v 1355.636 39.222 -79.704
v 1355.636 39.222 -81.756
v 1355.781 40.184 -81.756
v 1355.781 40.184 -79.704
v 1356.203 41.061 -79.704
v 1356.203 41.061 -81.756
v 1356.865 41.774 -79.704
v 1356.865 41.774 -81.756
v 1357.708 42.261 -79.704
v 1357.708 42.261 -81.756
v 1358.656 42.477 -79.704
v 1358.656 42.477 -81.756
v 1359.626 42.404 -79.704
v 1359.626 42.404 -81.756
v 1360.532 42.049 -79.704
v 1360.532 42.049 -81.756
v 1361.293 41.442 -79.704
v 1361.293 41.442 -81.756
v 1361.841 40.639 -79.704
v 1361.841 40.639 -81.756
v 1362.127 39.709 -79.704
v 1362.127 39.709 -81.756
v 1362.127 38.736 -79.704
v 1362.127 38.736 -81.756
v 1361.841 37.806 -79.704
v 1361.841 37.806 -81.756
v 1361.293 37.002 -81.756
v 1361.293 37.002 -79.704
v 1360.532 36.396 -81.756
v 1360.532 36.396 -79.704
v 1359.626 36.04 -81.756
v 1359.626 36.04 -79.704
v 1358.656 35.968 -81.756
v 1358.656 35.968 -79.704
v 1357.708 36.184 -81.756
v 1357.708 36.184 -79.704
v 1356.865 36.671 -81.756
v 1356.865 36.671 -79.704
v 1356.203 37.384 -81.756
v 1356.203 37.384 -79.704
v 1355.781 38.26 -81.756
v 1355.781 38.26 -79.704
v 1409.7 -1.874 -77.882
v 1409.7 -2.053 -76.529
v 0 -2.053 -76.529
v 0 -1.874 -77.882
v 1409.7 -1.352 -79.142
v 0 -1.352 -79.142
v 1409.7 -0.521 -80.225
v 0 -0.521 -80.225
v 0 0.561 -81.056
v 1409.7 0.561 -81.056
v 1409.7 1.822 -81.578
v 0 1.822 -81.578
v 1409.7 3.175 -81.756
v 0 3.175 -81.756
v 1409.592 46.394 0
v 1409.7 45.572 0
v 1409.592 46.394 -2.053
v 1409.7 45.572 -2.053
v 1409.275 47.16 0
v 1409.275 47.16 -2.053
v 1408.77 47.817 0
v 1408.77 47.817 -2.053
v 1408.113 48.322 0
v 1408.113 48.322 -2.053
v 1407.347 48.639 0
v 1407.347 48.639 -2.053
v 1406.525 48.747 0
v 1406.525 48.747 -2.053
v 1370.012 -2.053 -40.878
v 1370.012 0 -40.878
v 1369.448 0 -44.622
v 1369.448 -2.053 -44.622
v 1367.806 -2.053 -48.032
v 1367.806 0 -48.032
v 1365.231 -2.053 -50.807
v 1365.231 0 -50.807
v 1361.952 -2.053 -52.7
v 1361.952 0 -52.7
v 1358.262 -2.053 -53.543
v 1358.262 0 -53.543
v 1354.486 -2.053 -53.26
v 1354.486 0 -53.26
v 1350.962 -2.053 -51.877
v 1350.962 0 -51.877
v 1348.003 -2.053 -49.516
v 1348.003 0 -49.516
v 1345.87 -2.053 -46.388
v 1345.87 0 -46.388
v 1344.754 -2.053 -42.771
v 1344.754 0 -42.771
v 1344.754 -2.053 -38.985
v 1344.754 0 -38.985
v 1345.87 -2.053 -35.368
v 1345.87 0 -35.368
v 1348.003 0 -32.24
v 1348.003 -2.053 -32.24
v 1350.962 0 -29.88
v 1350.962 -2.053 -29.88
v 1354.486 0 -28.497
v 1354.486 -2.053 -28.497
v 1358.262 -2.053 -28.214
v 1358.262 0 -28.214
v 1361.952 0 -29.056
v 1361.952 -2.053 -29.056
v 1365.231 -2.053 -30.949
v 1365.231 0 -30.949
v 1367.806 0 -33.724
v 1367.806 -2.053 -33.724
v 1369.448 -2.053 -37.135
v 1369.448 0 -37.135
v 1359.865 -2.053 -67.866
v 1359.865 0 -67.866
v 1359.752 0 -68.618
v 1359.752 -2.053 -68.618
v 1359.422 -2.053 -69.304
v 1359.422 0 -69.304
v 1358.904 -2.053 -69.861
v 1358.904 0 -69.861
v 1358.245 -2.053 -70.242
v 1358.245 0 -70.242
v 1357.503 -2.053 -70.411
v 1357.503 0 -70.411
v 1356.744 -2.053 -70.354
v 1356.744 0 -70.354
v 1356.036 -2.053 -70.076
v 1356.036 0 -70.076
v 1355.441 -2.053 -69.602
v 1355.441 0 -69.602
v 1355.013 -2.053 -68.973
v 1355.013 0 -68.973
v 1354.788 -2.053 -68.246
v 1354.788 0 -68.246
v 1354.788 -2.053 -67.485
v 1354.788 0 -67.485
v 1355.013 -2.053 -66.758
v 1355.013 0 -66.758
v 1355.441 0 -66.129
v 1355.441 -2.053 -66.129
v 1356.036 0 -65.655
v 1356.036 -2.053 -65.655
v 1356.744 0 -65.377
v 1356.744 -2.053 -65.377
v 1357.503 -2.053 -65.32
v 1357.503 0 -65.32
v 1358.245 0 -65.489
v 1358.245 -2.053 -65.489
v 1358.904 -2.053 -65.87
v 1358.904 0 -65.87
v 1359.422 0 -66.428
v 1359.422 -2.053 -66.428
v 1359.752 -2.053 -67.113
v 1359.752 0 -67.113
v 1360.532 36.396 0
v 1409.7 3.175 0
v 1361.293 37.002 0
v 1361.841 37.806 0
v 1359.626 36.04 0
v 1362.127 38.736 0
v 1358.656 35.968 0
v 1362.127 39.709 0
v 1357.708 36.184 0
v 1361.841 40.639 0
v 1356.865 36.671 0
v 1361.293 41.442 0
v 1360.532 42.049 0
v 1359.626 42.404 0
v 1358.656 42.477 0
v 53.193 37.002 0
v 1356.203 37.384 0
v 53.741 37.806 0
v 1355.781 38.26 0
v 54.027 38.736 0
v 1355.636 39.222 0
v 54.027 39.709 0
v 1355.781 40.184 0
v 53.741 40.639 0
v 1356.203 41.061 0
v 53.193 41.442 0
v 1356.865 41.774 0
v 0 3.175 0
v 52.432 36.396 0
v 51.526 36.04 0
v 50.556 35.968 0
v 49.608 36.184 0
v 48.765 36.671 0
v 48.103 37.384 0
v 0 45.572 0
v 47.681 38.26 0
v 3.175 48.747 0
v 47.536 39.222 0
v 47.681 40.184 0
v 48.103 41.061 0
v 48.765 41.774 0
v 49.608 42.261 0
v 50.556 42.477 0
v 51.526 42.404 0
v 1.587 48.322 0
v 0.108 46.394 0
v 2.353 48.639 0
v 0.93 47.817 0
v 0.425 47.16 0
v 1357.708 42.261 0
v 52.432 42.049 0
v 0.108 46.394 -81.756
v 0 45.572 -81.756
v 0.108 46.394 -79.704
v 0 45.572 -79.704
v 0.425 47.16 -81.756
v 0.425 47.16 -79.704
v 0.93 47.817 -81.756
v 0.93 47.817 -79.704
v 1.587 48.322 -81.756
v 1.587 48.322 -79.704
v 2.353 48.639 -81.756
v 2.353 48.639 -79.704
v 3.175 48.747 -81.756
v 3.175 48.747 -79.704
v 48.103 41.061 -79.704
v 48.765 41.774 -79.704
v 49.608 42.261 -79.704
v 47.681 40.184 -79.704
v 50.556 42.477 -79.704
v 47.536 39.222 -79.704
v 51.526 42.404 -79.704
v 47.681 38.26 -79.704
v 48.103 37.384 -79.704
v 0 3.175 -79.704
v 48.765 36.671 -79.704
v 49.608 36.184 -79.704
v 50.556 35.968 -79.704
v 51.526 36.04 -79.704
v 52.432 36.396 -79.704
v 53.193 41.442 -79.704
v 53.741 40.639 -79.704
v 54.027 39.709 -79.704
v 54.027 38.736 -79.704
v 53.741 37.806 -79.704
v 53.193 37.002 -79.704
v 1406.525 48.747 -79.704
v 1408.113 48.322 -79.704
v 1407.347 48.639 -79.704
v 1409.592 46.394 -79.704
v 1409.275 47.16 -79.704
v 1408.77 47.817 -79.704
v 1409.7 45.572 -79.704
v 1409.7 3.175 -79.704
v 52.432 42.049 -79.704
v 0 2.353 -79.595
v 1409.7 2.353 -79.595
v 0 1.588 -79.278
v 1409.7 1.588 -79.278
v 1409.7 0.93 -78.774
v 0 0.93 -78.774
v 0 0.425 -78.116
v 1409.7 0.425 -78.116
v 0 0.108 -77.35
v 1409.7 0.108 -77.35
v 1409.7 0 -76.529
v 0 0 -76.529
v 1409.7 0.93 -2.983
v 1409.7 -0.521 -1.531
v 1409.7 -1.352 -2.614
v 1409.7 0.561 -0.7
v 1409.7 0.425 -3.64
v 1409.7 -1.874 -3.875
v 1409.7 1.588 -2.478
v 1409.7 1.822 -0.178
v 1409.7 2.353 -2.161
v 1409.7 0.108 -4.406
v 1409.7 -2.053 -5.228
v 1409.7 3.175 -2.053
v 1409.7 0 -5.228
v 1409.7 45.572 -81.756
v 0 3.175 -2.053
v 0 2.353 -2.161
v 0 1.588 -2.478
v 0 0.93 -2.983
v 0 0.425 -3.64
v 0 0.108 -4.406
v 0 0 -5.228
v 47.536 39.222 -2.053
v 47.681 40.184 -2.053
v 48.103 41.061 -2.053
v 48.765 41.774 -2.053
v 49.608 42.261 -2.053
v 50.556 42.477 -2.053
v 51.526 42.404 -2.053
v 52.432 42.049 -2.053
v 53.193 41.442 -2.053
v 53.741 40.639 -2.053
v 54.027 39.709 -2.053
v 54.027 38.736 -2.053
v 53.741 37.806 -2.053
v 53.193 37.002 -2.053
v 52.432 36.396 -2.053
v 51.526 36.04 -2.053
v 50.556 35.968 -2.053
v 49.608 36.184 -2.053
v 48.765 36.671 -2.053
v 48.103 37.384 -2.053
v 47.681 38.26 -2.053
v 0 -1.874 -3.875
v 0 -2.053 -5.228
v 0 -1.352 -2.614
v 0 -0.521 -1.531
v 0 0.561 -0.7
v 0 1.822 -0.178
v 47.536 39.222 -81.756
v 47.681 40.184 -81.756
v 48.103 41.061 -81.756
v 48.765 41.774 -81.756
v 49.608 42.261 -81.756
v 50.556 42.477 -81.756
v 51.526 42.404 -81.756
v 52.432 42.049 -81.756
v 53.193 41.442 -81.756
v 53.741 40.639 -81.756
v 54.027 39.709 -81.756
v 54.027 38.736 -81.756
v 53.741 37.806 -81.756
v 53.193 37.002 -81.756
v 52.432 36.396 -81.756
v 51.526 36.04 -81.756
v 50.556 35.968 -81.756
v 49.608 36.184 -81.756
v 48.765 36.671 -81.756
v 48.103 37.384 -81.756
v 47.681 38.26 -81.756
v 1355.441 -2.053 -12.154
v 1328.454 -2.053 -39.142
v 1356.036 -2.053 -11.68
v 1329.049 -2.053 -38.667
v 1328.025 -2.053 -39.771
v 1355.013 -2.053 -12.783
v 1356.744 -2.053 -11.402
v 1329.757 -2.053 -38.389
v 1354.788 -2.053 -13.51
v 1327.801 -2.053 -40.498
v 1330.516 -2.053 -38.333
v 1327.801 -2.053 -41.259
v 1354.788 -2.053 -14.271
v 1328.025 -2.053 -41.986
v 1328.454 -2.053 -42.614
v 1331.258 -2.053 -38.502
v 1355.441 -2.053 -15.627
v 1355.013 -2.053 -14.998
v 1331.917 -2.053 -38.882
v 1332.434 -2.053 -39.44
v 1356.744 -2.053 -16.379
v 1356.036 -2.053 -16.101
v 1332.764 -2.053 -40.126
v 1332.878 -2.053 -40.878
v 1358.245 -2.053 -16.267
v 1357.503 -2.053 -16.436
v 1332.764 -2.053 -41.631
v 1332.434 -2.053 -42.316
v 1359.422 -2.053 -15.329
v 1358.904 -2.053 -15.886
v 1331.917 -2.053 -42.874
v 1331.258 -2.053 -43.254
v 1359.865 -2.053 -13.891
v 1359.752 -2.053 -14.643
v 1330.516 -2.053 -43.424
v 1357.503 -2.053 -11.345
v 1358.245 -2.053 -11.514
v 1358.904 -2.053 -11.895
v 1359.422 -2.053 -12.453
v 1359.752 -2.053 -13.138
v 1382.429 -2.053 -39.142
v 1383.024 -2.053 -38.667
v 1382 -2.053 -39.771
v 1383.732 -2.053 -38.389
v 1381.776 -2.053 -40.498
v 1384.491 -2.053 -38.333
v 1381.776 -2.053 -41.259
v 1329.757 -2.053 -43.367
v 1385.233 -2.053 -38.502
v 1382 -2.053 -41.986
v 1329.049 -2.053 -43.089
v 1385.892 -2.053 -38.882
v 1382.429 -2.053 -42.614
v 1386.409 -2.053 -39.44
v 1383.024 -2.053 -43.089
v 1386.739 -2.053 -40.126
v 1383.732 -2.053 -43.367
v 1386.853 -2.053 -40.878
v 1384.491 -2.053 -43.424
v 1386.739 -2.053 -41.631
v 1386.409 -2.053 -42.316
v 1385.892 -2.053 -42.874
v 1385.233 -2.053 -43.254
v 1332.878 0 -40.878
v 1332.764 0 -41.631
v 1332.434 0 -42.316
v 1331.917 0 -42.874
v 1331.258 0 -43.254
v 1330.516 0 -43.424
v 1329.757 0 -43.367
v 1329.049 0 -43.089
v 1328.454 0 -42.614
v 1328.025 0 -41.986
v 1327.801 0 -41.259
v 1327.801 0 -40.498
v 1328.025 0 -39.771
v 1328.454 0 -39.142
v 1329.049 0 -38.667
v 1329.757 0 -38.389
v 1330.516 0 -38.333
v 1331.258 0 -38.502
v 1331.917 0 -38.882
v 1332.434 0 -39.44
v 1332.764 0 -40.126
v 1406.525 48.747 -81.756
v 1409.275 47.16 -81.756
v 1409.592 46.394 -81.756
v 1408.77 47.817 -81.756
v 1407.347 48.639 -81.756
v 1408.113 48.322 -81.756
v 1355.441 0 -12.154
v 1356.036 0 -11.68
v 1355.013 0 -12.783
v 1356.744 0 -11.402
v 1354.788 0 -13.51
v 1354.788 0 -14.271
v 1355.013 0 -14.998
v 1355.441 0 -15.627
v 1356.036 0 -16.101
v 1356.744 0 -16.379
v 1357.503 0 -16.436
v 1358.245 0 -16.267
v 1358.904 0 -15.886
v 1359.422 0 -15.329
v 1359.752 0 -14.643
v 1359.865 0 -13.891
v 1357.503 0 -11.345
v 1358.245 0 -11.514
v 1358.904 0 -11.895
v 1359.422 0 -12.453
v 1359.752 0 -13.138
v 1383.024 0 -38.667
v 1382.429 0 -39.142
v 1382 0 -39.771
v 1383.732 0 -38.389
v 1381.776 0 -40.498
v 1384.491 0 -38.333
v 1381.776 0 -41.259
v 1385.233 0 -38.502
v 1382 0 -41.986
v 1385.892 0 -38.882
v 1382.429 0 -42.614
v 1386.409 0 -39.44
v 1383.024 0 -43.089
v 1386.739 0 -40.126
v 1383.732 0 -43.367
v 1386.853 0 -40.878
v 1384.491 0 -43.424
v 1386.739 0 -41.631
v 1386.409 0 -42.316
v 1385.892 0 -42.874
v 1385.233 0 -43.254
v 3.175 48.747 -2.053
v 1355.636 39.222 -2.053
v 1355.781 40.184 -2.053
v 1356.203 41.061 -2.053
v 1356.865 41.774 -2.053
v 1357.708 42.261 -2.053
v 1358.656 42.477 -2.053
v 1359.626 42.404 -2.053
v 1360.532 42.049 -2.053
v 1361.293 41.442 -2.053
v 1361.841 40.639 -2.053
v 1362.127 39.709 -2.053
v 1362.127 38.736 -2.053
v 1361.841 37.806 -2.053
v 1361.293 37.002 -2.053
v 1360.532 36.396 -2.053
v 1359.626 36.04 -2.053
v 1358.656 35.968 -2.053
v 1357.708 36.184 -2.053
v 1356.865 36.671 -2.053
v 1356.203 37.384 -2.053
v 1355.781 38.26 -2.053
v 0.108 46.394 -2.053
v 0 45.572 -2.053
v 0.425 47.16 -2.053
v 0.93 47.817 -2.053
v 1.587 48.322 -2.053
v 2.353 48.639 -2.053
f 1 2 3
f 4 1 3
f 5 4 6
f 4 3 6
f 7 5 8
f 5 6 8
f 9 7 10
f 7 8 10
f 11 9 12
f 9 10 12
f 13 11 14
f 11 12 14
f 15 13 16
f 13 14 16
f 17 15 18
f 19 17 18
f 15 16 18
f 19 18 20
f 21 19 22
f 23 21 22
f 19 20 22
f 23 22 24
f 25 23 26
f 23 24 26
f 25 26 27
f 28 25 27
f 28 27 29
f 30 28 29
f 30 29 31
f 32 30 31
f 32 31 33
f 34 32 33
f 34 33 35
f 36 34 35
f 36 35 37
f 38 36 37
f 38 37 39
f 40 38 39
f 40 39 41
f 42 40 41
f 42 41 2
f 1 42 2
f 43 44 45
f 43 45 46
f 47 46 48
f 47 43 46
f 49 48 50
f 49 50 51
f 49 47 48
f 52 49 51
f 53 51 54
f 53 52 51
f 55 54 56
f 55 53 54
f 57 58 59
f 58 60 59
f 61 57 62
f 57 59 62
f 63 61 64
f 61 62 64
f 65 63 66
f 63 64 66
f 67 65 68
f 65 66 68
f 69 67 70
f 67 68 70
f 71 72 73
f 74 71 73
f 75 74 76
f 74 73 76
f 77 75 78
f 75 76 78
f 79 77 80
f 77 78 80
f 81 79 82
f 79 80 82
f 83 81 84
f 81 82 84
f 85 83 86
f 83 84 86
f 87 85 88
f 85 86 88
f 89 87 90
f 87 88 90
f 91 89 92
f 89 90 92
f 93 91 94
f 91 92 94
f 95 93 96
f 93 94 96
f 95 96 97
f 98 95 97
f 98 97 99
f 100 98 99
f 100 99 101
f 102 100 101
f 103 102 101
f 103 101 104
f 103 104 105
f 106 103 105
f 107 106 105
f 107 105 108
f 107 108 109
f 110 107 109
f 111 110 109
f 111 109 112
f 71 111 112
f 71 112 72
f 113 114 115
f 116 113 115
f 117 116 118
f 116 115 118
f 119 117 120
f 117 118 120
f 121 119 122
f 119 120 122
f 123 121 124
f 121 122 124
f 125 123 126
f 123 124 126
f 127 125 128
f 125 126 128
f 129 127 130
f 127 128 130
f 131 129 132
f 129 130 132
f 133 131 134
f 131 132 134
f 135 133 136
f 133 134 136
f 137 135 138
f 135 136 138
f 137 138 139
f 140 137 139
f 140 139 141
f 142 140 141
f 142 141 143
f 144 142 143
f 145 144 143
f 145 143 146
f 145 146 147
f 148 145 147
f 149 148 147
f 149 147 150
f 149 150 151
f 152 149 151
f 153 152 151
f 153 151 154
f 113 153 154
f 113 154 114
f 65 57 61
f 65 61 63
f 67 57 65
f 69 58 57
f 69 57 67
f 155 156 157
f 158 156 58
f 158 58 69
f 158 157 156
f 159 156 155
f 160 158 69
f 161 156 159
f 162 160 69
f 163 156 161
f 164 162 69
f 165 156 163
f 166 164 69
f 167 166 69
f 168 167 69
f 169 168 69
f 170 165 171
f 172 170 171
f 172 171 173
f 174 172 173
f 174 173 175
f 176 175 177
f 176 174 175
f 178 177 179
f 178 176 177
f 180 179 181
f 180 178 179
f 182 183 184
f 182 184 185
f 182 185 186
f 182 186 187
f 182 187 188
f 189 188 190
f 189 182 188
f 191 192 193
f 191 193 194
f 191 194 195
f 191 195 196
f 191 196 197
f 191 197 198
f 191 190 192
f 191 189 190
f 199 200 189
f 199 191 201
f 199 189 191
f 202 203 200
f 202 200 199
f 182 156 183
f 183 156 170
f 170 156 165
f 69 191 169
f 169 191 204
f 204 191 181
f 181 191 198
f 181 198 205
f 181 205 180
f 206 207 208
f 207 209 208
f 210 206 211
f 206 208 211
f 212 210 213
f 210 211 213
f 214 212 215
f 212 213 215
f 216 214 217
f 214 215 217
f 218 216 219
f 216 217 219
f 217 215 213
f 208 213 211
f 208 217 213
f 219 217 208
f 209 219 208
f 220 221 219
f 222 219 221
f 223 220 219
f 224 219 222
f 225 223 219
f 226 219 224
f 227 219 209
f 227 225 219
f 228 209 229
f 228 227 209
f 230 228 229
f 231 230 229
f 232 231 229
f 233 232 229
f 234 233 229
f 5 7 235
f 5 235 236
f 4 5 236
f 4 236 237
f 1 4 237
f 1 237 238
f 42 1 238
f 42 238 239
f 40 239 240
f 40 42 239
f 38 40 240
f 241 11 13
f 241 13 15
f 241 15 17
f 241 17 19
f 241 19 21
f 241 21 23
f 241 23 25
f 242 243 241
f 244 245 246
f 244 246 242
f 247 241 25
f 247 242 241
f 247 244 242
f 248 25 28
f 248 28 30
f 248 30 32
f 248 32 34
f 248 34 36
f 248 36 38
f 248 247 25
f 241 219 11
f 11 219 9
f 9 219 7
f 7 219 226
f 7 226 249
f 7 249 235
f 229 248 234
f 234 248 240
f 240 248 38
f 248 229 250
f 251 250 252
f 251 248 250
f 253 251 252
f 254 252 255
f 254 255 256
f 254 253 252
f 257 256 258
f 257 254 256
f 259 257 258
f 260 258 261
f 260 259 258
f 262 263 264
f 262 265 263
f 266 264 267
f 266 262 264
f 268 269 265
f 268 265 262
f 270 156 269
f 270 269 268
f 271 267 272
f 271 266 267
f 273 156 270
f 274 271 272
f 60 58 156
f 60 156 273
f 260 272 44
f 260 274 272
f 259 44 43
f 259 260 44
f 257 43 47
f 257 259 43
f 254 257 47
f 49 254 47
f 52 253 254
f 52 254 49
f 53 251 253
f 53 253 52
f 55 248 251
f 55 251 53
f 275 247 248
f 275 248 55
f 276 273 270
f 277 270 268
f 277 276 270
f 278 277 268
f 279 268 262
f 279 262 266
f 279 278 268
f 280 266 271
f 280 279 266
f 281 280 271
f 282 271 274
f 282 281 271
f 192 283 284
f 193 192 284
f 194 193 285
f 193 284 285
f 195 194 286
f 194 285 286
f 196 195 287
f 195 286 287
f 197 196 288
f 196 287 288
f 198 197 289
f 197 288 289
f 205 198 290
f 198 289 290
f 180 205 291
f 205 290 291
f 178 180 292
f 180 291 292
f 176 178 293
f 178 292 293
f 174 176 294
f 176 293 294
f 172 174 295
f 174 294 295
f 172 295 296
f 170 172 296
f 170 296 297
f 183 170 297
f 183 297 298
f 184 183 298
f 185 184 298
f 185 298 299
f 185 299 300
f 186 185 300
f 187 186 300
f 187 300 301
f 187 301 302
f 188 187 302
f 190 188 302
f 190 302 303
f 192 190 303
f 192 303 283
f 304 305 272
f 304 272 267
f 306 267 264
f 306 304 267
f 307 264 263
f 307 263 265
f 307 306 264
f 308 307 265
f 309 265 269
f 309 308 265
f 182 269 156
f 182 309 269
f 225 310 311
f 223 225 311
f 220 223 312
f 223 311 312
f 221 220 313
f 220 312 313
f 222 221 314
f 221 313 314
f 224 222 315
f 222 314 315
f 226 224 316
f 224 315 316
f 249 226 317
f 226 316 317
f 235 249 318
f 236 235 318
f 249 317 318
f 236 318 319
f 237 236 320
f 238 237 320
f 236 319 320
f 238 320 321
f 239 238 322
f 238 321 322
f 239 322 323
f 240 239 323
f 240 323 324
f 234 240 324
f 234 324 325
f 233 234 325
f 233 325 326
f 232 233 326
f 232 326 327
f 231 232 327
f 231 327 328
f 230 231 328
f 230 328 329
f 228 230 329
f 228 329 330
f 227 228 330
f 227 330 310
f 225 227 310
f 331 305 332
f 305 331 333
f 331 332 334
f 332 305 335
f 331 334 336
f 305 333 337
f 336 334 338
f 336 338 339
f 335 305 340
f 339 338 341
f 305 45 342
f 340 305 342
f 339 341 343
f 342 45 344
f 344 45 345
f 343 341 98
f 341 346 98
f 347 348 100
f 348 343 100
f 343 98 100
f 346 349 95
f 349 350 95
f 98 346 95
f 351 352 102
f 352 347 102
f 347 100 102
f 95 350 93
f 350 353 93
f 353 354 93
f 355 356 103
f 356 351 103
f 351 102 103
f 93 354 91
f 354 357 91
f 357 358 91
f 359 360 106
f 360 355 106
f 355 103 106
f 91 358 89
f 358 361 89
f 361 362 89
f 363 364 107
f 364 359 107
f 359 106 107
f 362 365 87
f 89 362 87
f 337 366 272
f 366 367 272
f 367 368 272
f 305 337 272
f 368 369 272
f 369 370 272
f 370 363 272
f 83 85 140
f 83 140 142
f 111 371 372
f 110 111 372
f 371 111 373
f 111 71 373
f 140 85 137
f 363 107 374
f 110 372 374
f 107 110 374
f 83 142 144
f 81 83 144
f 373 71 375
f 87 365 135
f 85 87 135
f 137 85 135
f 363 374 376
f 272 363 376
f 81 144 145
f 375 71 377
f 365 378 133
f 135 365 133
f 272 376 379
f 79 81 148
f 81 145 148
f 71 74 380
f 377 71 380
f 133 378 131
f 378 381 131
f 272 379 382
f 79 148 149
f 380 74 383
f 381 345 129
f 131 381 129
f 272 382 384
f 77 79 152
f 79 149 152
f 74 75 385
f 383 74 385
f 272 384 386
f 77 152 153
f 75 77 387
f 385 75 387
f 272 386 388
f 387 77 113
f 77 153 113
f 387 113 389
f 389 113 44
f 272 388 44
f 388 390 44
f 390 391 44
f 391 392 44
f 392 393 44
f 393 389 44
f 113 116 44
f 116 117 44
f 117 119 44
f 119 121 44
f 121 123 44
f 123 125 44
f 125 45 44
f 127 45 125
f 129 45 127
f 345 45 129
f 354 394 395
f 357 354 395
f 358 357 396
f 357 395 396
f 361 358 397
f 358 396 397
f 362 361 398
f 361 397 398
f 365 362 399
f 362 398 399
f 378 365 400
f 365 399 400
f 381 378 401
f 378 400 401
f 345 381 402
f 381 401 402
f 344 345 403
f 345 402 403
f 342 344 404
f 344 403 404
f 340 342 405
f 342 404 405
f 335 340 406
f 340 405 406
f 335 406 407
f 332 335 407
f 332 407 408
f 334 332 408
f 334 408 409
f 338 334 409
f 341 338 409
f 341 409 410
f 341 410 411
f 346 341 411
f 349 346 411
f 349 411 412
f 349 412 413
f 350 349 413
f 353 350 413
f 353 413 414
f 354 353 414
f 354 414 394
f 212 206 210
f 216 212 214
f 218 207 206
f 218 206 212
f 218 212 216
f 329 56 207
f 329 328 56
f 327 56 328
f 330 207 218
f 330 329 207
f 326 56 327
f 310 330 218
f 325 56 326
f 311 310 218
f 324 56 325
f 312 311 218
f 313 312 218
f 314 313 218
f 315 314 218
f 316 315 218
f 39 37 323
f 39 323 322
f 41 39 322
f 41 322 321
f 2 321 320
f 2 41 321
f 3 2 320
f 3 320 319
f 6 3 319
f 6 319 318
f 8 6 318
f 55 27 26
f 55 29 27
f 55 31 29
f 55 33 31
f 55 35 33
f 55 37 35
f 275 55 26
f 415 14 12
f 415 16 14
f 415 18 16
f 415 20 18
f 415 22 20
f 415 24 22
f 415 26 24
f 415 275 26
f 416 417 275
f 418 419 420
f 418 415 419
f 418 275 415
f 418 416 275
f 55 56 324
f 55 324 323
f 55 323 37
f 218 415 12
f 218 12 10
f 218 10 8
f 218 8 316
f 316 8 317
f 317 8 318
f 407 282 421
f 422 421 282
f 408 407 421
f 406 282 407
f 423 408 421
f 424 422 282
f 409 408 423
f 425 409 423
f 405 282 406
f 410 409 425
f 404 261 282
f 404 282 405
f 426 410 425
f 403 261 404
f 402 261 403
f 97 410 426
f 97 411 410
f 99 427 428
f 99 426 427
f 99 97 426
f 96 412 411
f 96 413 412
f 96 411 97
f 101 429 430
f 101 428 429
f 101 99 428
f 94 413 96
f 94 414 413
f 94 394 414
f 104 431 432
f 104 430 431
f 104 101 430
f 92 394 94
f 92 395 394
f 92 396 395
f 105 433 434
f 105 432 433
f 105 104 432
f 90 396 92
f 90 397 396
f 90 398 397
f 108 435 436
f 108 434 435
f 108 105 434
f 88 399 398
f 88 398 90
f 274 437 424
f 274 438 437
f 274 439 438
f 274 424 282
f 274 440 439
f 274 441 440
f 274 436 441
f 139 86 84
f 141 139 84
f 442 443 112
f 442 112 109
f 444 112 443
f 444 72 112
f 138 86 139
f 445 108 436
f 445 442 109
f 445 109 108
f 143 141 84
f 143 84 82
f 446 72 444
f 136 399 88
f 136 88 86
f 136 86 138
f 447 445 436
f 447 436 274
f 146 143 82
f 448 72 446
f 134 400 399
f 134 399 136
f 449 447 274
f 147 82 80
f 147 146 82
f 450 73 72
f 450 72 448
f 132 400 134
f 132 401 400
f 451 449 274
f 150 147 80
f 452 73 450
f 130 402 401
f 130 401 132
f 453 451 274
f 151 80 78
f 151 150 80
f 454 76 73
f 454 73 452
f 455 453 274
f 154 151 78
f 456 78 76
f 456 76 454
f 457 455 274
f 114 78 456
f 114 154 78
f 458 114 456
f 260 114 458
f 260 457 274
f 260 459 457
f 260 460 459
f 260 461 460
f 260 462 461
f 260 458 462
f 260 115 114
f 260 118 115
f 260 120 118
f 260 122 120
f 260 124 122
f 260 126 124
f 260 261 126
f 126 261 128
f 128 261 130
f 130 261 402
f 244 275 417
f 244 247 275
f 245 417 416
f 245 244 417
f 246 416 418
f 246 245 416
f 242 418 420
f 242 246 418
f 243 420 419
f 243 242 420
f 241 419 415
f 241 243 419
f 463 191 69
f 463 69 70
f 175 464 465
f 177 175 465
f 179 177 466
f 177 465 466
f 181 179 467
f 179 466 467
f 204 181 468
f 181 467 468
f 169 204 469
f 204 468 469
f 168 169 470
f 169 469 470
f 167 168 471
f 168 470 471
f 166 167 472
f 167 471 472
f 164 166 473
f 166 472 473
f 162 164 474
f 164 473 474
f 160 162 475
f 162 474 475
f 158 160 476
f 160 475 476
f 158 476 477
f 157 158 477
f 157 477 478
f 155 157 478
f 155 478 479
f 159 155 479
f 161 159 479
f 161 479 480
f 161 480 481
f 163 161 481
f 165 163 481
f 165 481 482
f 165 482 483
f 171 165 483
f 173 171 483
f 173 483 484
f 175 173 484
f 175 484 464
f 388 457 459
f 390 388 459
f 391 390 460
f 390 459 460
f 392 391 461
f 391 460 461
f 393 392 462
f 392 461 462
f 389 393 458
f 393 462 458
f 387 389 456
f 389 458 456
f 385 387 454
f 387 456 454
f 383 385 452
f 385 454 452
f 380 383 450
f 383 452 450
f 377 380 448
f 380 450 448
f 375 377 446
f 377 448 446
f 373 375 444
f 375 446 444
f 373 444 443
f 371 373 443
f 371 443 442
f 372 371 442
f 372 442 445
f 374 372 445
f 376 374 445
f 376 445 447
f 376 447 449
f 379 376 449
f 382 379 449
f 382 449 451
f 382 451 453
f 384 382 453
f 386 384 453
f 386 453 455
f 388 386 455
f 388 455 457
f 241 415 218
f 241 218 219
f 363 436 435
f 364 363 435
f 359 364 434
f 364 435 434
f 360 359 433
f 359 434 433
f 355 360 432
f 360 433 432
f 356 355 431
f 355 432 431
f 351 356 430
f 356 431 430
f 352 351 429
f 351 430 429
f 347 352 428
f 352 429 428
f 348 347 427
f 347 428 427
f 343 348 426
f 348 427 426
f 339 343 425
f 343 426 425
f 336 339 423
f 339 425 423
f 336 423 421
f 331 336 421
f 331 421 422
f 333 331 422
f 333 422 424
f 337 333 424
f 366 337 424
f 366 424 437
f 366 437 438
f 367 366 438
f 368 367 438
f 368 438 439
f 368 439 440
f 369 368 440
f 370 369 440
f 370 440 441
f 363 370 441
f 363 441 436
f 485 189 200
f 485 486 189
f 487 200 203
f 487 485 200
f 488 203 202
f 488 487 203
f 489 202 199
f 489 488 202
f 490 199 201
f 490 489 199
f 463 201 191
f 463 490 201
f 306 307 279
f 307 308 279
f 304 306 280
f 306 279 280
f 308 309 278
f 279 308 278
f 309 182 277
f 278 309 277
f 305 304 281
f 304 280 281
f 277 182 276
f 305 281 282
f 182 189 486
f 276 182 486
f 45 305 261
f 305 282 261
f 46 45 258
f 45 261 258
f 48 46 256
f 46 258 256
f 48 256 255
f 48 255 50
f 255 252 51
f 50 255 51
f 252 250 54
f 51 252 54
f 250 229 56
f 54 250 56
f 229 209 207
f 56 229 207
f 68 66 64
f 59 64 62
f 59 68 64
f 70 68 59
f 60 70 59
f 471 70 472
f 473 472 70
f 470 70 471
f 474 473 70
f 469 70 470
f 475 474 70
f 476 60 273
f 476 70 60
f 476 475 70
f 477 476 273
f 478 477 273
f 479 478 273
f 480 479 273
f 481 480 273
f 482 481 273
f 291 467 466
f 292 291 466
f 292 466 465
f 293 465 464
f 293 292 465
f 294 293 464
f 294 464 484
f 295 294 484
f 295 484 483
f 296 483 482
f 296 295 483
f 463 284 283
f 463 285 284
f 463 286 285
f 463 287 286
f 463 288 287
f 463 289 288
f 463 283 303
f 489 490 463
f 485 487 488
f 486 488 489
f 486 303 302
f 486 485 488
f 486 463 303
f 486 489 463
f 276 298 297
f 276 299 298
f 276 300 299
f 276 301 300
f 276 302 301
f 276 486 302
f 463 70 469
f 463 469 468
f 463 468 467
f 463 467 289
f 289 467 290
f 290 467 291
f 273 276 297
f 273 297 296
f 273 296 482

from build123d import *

# Parameters (mm, degrees)
SKETCH1_W                      = 1409.7
SKETCH1_H                      = 81.75625
BASE_FLANGE1_DEPTH             = 2.052574
EDGE_FLANGE1_STRIP_W           = 14.560296
EDGE_FLANGE1_STRIP_H           = 2.052574
EDGE_FLANGE1_STRIP_CUT_DEPTH   = 1409.7
EDGE_FLANGE1_STRIP_2_W         = 14.560296
EDGE_FLANGE1_STRIP_2_H         = 2.052574
EDGE_FLANGE1_STRIP_CUT_2_DEPTH = 1409.7
EDGE_FLANGE1_DEPTH             = 1409.7
EDGE_FLANGE1_BEND_DEPTH        = 1409.7
F_7_0_201_DIAMETER_HOLE1_D     = 5.1054
F_0_257_DIAMETER_HOLE1_D       = 6.5278
FILLET1_R                      = 3.175
F_1_1_DIAMETER_HOLE1_D         = 25.4


# Sheet-metal steps are written as plain solids
with BuildPart() as part:
    # Sketch1 → Base-Flange1 (new body)
    with BuildSketch(Plane(origin=(0, 0, 0), x_dir=(1, 0, 0), z_dir=(0, 1, 0))):
        with Locations((704.85, 40.878125)):
            Rectangle(SKETCH1_W, SKETCH1_H)
    extrude(amount=-BASE_FLANGE1_DEPTH)

    # Edge-Flange1 strip (across the edge) → Edge-Flange1 strip cut (cut)
    with BuildSketch(Plane(origin=(0, 0, 0), x_dir=(0, 0, -1), z_dir=(1, 0, 0))):
        with Locations((-2.052574, -1.026287)):
            Rectangle(EDGE_FLANGE1_STRIP_W, EDGE_FLANGE1_STRIP_H)
    extrude(amount=EDGE_FLANGE1_STRIP_CUT_DEPTH, mode=Mode.SUBTRACT)

    # Edge-Flange1 strip 2 (across the edge) → Edge-Flange1 strip cut 2 (cut)
    with BuildSketch(Plane(origin=(1409.7, 0, -81.75625), x_dir=(0, 0, 1), z_dir=(-1, 0, 0))):
        with Locations((-2.052574, -1.026287)):
            Rectangle(EDGE_FLANGE1_STRIP_2_W, EDGE_FLANGE1_STRIP_2_H)
    extrude(amount=EDGE_FLANGE1_STRIP_CUT_2_DEPTH, mode=Mode.SUBTRACT)

    # Edge-Flange1 section (across the edge) → Edge-Flange1 (add)
    with BuildSketch(Plane(origin=(0, 0, 0), x_dir=(0, 0, -1), z_dir=(1, 0, 0))):
        with BuildLine():
            Line((0, 3.175), (0, 48.747426))
            Line((0, 48.747426), (2.052574, 48.747426))
            Line((2.052574, 48.747426), (2.052574, 3.175))
            ThreePointArc((2.052574, 3.175), (2.98250997, 0.92993597), (5.227574, 0))
            Line((5.227574, 0), (5.227574, -2.052574))
            ThreePointArc((5.227574, -2.052574), (1.531120975, -0.521453025), (0, 3.175))
        make_face()
    extrude(amount=EDGE_FLANGE1_DEPTH)

    # Edge-Flange1 section 2 (across the edge) → Edge-Flange1 bend (add)
    with BuildSketch(Plane(origin=(1409.7, 0, -81.75625), x_dir=(0, 0, 1), z_dir=(-1, 0, 0))):
        with BuildLine():
            Line((0, 3.175), (0, 48.747426))
            Line((0, 48.747426), (2.052574, 48.747426))
            Line((2.052574, 48.747426), (2.052574, 3.175))
            ThreePointArc((2.052574, 3.175), (2.98250997, 0.92993597), (5.227574, 0))
            Line((5.227574, 0), (5.227574, -2.052574))
            ThreePointArc((5.227574, -2.052574), (1.531120975, -0.521453025), (0, 3.175))
        make_face()
    extrude(amount=EDGE_FLANGE1_BEND_DEPTH)

    # #7 (0.201) Diameter Hole1 (through all)
    with Locations(Plane(origin=(0, -2.052574, 0), x_dir=(-1, 0, 0), z_dir=(0, -1, 0))):
        with Locations((-1384.3, 40.878125), (-1330.325, 40.878125), (-1357.3125, 67.865625), (-1357.3125, 13.890625)):
            Hole(F_7_0_201_DIAMETER_HOLE1_D / 2)

    # F (0.257) Diameter Hole1 (through all)
    with Locations(Plane.XY):
        with Locations((1358.9, 39.222426), (50.8, 39.222426)):
            Hole(F_0_257_DIAMETER_HOLE1_D / 2)

    # Fillet1
    fillet1_edges = [part.edges().sort_by_distance(p)[0] for p in [
        (0, 48.747426, -1.026287),
        (1409.7, 48.747426, -1.026287),
        (1409.7, 48.747426, -80.729963),
        (0, 48.747426, -80.729963),
    ]]
    fillet(fillet1_edges, radius=FILLET1_R)

    # 1 (1) Diameter Hole1 (through all)
    with Locations(Plane(origin=(0, -2.052574, 0), x_dir=(-1, 0, 0), z_dir=(0, -1, 0))):
        with Locations((-1357.3125, 40.878125)):
            Hole(F_1_1_DIAMETER_HOLE1_D / 2)


solid = part.part
